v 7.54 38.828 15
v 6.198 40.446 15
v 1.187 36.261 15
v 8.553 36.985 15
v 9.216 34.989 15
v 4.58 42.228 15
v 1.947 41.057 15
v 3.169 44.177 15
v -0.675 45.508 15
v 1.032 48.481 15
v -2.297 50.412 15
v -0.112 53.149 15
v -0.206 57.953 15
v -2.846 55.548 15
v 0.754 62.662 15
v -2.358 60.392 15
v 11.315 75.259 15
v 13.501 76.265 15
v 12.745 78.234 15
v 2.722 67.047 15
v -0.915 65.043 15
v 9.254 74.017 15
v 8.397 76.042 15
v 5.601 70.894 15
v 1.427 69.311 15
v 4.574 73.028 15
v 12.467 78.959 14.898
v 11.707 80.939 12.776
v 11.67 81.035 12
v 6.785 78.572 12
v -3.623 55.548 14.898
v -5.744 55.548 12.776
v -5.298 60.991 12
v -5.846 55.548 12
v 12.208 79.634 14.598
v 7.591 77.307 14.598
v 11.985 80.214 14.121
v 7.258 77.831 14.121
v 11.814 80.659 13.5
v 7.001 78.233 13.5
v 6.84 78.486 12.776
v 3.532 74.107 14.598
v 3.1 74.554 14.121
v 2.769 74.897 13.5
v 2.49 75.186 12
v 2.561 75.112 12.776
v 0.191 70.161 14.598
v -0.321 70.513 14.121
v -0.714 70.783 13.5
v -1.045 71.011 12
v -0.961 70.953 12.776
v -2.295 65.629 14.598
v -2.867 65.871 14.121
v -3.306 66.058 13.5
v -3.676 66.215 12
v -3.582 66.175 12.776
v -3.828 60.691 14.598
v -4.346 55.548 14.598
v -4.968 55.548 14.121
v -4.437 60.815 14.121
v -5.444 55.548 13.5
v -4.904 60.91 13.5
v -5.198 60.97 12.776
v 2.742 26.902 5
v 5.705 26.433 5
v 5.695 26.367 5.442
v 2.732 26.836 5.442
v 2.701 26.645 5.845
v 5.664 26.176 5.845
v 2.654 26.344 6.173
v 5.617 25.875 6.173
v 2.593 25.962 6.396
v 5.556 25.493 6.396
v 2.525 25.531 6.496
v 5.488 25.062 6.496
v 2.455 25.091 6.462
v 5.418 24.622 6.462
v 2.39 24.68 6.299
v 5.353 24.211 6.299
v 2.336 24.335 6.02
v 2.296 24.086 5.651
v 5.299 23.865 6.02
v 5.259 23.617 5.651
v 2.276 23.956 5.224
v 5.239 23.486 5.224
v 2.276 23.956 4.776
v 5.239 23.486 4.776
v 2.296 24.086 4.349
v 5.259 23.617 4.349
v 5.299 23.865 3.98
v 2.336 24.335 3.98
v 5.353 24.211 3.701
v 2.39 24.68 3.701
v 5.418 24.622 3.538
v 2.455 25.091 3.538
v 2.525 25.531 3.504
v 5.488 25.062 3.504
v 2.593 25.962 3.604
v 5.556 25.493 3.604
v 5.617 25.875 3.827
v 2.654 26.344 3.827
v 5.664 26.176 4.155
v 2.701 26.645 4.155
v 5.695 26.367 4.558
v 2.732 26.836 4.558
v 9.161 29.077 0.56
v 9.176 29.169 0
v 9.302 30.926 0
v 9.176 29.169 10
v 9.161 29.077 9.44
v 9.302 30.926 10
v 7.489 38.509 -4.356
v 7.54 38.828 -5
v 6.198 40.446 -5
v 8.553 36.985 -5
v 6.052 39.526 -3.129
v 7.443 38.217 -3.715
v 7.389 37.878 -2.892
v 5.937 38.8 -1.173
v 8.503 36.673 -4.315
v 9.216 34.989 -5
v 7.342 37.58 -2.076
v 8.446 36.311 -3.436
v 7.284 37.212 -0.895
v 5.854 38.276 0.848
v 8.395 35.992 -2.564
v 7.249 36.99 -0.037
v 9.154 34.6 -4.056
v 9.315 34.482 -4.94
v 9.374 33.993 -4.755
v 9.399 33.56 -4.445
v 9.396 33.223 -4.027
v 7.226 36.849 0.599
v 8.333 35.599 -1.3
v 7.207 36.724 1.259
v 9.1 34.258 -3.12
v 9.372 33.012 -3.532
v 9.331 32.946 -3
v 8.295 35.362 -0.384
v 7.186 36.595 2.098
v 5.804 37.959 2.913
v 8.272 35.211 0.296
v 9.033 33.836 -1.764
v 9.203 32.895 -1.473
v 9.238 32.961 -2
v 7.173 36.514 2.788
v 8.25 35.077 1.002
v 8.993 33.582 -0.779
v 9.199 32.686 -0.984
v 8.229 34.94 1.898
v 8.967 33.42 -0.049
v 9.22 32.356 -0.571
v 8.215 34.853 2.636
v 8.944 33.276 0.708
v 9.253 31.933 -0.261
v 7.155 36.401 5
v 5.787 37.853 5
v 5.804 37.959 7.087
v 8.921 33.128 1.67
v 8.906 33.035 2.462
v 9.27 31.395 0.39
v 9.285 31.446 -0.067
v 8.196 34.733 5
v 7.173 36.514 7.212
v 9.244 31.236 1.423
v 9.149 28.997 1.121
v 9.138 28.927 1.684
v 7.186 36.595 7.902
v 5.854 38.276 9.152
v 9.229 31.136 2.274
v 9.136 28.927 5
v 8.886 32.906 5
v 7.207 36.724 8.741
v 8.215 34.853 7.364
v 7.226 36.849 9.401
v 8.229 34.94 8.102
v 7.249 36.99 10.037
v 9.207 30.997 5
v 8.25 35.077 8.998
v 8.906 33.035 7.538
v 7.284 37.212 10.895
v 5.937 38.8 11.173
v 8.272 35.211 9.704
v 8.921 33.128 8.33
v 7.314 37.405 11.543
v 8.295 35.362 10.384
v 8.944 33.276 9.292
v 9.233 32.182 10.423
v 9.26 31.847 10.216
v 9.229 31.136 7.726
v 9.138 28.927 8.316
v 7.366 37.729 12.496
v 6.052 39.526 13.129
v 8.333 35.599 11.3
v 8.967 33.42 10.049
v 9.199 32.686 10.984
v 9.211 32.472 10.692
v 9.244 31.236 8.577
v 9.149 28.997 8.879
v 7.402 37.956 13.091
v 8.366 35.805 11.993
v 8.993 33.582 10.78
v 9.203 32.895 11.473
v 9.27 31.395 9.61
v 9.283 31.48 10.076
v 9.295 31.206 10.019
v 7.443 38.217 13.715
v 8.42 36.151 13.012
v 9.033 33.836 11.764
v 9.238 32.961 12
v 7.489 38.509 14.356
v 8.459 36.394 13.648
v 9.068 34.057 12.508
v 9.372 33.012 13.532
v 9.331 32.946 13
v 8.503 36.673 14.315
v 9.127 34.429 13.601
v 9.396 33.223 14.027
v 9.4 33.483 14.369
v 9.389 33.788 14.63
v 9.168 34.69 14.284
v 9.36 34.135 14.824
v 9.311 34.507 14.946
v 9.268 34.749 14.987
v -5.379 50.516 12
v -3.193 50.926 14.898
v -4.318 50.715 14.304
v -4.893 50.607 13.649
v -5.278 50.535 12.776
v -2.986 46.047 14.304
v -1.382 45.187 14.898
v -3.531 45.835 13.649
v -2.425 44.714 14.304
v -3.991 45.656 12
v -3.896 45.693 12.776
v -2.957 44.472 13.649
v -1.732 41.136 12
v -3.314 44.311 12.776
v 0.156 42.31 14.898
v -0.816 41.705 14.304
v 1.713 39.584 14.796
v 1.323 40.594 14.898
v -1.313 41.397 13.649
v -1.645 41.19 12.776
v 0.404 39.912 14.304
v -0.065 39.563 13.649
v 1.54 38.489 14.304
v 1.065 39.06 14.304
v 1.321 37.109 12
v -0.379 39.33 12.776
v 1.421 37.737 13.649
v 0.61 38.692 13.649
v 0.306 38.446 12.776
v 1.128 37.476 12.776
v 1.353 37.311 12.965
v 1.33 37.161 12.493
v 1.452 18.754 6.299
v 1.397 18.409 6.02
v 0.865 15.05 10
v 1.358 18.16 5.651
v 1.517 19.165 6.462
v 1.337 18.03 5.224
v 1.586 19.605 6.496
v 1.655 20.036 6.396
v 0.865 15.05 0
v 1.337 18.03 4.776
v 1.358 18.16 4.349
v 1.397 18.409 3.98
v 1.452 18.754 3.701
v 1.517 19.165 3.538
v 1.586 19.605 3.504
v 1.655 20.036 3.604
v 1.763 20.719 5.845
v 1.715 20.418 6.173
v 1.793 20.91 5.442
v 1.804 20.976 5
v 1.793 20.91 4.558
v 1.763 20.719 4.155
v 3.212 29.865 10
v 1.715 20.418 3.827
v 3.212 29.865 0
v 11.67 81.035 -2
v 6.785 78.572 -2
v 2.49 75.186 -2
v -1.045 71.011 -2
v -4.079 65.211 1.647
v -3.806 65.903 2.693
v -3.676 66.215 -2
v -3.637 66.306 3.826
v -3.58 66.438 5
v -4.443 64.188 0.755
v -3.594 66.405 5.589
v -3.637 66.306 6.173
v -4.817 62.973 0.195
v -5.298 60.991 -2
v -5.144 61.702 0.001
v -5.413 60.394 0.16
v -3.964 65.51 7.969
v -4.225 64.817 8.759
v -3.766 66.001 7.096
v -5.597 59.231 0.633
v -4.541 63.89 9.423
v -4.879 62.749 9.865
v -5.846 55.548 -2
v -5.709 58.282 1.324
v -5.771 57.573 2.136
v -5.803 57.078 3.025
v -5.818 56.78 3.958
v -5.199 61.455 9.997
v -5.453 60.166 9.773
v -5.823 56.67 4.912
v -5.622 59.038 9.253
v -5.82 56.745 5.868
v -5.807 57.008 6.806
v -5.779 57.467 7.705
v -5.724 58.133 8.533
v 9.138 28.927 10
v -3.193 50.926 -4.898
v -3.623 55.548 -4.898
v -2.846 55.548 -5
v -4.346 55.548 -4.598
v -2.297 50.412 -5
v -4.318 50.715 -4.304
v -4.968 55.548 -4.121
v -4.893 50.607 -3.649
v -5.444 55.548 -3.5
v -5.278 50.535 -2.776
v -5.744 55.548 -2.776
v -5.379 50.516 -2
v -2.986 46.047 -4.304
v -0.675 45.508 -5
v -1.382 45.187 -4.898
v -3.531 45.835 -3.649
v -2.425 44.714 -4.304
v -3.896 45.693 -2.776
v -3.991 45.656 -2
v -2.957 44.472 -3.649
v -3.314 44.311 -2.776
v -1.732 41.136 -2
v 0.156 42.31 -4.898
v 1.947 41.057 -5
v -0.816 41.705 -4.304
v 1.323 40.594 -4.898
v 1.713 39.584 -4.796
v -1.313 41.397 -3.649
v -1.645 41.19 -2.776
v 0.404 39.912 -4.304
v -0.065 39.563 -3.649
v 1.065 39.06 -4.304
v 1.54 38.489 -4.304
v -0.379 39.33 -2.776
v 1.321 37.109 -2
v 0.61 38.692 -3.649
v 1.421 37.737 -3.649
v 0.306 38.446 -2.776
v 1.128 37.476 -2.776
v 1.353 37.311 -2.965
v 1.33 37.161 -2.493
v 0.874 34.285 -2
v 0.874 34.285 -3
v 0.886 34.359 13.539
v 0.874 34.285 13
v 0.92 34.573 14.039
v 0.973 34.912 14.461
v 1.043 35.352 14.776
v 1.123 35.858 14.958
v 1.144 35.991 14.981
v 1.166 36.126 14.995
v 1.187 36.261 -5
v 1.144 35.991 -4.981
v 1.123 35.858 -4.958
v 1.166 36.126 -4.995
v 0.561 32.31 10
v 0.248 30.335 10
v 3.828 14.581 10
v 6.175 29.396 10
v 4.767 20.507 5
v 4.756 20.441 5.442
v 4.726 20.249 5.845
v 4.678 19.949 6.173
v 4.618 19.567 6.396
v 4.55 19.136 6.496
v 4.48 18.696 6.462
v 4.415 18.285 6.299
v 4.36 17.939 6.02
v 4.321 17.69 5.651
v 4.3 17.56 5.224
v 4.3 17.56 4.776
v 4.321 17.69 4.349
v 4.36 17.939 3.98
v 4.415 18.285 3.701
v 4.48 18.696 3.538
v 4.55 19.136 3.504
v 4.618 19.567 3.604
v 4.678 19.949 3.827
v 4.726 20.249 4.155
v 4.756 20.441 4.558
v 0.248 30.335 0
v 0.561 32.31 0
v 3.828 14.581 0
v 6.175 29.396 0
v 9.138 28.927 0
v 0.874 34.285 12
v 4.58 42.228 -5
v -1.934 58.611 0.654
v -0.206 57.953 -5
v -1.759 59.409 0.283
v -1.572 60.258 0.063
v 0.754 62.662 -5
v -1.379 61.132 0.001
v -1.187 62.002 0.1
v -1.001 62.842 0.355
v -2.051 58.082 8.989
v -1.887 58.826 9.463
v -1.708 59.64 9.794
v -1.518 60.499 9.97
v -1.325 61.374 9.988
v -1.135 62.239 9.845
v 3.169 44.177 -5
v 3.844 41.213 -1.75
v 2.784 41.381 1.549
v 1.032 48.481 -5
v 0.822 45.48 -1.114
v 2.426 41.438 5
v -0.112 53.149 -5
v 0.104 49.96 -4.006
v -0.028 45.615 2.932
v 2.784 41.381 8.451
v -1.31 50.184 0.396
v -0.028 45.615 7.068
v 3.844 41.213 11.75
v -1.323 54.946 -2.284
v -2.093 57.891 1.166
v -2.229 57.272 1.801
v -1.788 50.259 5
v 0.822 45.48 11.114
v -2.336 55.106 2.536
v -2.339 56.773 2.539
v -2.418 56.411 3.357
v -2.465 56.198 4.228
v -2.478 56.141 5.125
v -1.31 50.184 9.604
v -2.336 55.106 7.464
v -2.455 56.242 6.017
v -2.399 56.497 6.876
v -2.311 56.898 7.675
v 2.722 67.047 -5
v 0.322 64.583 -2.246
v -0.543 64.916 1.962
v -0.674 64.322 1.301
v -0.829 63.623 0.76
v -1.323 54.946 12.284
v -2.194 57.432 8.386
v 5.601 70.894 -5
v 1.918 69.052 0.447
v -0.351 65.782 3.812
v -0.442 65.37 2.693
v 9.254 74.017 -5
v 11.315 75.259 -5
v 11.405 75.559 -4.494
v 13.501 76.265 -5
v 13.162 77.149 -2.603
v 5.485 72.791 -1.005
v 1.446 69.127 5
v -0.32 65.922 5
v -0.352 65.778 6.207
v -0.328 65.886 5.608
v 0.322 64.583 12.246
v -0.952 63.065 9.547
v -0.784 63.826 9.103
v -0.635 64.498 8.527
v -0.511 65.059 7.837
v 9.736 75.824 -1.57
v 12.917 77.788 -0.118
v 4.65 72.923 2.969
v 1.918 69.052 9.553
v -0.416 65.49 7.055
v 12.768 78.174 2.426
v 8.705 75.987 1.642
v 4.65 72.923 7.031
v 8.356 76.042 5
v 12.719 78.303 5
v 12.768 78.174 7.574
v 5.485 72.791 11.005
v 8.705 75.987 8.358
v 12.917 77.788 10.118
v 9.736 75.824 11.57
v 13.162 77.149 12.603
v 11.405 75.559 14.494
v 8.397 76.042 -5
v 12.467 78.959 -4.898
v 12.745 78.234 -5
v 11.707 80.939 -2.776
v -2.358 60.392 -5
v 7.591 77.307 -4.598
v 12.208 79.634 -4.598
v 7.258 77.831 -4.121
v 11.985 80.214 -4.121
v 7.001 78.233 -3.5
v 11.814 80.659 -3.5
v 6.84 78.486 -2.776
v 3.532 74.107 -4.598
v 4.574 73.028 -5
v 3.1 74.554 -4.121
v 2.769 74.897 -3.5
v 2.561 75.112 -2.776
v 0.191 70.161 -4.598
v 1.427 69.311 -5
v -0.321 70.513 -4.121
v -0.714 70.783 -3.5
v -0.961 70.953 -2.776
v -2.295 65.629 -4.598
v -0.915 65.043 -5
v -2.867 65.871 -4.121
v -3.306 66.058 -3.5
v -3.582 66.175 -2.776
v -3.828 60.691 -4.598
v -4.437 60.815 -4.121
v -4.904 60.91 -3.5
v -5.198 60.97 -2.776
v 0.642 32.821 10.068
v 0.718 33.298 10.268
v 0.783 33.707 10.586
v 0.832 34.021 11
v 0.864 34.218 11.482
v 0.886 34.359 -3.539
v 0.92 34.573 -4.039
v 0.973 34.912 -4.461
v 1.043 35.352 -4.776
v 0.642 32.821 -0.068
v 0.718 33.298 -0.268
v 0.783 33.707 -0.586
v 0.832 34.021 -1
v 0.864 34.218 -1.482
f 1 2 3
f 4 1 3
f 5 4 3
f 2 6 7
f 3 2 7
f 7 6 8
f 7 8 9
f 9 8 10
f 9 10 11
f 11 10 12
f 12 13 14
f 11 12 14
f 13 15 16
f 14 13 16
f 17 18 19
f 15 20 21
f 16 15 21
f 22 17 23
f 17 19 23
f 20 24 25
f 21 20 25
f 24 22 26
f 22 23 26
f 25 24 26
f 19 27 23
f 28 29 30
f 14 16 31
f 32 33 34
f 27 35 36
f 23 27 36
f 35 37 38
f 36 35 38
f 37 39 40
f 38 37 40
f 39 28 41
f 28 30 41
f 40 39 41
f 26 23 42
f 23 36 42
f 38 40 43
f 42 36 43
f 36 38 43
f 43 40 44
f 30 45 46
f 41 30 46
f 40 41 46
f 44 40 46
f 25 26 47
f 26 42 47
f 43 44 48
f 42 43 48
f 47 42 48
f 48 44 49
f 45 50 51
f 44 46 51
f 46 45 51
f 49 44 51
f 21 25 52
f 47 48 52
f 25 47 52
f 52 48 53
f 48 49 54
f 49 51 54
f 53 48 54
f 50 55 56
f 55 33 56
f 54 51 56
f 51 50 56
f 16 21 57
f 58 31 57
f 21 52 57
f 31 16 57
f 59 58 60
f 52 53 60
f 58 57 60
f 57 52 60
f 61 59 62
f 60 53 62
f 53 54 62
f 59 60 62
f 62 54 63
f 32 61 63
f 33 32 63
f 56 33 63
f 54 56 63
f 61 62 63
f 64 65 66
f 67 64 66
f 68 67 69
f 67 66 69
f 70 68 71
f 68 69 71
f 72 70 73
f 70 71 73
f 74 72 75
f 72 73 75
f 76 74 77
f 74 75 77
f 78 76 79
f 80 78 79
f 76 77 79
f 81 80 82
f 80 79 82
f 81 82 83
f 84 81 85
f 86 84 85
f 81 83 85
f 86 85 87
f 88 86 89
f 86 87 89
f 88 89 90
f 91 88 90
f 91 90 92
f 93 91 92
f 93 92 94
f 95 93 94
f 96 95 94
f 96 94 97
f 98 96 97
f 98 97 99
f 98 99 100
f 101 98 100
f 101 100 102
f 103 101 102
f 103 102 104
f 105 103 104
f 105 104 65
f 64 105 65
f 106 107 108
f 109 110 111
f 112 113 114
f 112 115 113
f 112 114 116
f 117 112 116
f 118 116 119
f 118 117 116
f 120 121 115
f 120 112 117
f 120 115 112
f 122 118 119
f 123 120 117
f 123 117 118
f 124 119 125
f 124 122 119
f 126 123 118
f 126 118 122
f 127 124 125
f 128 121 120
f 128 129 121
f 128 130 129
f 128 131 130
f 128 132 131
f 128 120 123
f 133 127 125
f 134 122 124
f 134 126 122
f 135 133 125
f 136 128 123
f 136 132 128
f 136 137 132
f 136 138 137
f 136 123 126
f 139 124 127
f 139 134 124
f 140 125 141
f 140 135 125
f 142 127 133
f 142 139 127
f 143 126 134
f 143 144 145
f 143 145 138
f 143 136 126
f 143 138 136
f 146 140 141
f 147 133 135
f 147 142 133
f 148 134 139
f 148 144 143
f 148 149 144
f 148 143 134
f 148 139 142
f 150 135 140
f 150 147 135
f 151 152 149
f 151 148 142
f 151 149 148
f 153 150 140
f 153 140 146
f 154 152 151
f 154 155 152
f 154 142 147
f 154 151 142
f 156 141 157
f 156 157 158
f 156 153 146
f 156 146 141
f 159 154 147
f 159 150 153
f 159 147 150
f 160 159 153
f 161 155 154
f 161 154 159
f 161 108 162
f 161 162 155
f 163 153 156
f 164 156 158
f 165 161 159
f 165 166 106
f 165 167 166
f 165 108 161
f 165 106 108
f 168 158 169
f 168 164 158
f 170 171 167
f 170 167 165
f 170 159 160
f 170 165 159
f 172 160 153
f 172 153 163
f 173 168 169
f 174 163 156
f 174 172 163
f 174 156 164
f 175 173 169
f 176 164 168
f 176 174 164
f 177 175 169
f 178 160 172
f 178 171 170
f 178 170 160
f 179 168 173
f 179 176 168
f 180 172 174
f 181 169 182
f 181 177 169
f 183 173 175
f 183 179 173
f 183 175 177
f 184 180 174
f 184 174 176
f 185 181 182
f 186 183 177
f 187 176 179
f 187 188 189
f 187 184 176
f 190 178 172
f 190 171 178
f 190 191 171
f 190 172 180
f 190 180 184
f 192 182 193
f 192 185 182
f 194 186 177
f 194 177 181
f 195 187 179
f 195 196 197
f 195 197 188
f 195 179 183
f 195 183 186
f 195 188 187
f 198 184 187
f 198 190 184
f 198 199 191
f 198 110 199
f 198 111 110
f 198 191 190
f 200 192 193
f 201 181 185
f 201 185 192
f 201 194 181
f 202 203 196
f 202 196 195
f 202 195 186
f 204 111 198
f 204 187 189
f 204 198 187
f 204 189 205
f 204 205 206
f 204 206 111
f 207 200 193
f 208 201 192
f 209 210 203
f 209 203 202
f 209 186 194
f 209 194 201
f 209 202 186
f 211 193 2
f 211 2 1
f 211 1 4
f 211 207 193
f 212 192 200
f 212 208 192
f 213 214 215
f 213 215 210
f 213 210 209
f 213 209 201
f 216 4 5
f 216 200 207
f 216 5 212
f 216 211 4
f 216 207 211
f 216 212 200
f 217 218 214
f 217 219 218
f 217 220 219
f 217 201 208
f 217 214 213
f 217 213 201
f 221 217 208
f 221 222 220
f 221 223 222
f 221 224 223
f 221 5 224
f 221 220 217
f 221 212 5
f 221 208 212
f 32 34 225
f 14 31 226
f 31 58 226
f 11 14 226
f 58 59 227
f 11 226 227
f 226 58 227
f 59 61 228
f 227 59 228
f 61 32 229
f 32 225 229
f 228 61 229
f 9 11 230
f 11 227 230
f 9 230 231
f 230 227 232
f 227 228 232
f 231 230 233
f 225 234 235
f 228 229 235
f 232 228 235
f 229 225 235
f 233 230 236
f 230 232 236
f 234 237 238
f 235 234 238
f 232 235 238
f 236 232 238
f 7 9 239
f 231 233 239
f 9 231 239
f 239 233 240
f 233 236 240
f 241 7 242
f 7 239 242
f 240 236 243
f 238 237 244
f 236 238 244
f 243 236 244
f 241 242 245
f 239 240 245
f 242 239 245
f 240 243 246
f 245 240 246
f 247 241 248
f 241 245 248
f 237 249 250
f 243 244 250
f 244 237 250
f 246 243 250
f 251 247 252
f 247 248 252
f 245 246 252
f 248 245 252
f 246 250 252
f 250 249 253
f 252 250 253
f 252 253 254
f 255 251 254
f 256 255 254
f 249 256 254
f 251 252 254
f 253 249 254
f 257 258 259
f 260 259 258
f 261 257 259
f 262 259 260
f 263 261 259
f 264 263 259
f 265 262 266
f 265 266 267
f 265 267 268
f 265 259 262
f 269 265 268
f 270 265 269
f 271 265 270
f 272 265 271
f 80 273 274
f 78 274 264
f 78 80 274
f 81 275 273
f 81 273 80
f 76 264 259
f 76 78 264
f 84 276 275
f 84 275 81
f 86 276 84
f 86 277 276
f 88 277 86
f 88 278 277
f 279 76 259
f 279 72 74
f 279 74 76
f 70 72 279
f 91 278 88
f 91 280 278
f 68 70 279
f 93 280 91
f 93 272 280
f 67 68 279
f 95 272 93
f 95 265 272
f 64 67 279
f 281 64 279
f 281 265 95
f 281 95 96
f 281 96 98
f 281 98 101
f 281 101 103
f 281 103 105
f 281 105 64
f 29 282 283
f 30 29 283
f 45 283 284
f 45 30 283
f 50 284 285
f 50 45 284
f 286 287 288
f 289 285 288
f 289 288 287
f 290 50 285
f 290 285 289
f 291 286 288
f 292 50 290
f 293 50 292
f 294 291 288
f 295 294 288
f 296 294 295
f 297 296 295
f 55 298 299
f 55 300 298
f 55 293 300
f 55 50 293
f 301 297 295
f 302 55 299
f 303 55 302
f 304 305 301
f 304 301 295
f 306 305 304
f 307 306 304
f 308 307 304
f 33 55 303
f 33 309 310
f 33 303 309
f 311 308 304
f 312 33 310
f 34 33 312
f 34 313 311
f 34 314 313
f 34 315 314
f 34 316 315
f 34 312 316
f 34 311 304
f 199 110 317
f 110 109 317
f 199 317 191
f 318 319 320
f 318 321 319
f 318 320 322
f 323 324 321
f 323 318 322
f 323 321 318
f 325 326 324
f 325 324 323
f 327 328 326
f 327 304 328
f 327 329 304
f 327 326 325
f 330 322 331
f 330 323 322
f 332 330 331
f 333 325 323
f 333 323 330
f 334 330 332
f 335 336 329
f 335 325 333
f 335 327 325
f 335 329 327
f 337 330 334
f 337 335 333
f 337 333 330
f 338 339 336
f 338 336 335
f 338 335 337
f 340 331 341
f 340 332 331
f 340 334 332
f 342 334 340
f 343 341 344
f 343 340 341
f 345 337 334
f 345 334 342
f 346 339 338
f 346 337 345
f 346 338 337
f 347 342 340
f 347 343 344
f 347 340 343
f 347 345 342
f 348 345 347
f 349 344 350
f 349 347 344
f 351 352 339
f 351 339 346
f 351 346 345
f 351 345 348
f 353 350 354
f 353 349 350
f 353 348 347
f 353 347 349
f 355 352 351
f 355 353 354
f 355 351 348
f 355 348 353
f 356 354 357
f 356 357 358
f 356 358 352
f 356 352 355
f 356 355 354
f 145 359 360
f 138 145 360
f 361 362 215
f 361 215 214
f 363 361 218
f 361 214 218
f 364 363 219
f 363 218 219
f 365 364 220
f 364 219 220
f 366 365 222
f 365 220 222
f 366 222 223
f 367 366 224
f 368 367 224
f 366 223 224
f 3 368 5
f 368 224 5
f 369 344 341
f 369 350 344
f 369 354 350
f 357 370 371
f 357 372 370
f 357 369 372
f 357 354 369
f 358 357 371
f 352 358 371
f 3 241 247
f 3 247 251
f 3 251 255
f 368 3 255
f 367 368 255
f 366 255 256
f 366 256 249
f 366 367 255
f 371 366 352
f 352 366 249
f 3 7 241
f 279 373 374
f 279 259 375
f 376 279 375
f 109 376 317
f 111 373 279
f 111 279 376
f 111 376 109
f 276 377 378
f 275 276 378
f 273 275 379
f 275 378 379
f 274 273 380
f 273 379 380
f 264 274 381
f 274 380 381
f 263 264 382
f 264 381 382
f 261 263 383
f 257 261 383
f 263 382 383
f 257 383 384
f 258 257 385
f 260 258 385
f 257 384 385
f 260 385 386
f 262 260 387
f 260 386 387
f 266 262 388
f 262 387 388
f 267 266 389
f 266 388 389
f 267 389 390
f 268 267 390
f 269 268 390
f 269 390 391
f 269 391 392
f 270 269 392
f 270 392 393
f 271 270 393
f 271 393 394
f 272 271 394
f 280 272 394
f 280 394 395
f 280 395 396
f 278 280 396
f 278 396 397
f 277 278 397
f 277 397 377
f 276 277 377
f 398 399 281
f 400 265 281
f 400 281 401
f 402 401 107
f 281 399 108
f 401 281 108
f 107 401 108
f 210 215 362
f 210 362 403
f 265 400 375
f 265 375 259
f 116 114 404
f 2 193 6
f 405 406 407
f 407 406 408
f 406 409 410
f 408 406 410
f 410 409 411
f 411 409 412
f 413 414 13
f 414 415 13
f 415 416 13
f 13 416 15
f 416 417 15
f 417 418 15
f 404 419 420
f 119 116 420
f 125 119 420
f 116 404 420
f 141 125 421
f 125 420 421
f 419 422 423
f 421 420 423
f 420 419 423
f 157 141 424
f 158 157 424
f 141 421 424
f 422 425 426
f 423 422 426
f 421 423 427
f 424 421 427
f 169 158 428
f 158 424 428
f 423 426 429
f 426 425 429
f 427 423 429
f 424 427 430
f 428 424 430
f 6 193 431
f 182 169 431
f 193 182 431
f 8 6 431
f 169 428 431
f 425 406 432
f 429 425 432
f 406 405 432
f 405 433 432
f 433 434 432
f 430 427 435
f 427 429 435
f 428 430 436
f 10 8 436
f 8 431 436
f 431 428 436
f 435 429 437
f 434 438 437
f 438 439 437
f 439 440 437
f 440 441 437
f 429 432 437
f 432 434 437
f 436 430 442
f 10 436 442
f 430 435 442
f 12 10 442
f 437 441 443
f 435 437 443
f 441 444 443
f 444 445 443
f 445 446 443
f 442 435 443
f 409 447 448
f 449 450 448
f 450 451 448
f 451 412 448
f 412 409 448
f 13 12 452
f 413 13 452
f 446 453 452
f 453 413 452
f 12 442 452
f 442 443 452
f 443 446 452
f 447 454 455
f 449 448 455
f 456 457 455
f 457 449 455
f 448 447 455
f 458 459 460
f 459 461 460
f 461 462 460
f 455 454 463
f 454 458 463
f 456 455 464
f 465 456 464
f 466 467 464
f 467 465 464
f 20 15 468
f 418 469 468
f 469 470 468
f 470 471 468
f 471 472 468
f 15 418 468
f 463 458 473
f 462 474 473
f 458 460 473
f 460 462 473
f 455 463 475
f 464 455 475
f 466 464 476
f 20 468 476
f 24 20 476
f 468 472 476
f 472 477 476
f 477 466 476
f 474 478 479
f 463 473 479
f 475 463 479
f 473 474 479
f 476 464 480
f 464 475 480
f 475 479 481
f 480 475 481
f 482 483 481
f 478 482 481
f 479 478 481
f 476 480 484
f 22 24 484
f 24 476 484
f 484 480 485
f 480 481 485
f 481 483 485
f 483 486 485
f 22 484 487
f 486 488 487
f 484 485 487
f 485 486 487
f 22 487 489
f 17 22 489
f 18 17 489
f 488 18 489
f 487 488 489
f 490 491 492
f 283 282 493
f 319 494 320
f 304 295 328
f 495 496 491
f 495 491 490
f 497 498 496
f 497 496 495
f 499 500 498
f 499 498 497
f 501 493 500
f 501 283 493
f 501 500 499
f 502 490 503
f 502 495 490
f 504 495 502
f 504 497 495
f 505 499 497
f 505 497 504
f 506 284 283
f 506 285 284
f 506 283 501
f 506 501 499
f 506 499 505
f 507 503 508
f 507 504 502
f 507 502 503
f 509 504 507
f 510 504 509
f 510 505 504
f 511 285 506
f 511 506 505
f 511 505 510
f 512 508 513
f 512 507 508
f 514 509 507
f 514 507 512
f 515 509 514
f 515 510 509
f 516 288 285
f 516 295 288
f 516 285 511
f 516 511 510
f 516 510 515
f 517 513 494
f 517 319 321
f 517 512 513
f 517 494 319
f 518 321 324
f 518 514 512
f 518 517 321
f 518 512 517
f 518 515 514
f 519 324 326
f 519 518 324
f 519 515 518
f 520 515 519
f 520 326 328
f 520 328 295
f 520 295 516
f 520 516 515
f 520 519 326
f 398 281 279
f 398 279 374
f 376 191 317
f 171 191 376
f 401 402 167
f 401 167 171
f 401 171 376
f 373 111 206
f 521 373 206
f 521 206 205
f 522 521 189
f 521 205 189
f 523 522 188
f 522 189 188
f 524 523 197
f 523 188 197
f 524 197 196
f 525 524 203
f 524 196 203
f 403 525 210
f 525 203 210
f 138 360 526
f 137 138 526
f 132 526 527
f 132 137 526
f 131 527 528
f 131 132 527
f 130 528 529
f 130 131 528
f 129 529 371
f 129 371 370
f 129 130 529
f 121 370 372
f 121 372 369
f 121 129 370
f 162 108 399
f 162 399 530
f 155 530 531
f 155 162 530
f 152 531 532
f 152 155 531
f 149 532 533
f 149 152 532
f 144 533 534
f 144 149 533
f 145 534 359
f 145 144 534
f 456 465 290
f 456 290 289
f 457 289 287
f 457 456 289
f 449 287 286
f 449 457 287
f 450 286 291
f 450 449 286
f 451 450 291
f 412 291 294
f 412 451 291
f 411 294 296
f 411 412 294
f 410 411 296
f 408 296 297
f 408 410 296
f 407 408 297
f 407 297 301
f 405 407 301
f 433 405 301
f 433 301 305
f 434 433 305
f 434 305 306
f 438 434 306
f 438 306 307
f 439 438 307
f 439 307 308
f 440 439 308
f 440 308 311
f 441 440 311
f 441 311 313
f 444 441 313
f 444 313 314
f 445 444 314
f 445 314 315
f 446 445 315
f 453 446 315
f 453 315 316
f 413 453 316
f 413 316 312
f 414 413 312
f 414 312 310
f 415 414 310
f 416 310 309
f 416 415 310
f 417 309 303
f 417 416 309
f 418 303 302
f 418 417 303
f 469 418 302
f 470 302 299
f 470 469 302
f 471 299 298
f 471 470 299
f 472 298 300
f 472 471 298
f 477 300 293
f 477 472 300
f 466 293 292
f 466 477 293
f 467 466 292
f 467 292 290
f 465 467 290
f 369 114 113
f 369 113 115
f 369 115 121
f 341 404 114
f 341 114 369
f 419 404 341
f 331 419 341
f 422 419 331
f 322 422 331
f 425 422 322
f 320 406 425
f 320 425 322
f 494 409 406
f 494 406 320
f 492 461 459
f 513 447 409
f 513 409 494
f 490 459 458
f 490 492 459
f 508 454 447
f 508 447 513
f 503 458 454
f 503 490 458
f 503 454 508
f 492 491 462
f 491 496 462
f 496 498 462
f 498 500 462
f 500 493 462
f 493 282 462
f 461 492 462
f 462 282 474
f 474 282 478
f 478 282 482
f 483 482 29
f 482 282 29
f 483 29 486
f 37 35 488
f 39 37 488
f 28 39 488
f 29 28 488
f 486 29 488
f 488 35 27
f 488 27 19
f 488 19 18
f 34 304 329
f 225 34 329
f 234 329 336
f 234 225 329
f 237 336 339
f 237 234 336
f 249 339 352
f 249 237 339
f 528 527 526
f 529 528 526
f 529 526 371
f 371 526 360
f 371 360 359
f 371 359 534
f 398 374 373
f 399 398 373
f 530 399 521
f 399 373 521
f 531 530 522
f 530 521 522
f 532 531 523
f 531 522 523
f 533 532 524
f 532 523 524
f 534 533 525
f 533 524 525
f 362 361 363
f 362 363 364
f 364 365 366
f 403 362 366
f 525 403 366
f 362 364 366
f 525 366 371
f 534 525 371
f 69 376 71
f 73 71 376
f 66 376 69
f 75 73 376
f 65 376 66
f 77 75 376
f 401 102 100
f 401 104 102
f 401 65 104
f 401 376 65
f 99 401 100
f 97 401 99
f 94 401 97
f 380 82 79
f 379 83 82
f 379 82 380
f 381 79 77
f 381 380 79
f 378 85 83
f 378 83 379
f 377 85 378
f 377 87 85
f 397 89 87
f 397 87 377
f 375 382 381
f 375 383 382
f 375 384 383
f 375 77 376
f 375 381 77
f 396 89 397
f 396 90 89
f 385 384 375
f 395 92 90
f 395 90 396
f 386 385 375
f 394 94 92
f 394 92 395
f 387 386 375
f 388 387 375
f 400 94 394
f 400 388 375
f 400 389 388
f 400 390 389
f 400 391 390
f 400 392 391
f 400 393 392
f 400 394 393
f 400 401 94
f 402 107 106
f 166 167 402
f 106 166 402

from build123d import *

# Parameters (mm, degrees)
SKETCH_1_R               = 13.75
EXTRUDE_1_DEPTH          = 10
CUT_EXTRUDE_1_DEPTH      = 22.866069606
PATTERN_CIRCULAR_1_COUNT = 20
EXTRUDE_2_DEPTH          = 5
EXTRUDE_2_DEPTH_BACK     = 15
CUT_EXTRUDE_3_DEPTH      = 10
CUT_EXTRUDE_3_DEPTH_BACK = 32
SKETCH_7_W               = 5
SKETCH_7_H               = 34
CUT_EXTRUDE_START        = -22
CUT_EXTRUDE_4_DEPTH      = 22
FILLET_2_R               = 2
FILLET_3_R               = 3
SKETCH_16_R              = 2
CUT_EXTRUDE_5_DEPTH      = 16.5
EXTRUDE_START            = 3.5
SKETCH_18_R              = 5
SKETCH_18_R_2            = 2
EXTRUDE_4_DEPTH          = 3.5
SKETCH_19_R              = 8
CUT_EXTRUDE_7_DEPTH      = 3
FILLET_4_R               = 2
CUT_EXTRUDE_8_DEPTH      = 10
CUT_EXTRUDE_9_DEPTH      = 22
SKETCH_22_R              = 1.5
CUT_EXTRUDE_10_DEPTH     = 22
SKETCH_24_R              = 5
CUT_EXTRUDE_11_DEPTH     = 26
FILLET_5_R               = 10


with BuildPart() as part:
    # 草图1 → 凸台-拉伸1 (new body)
    with BuildSketch(Plane.XY):
        Circle(SKETCH_1_R)
    extrude(amount=EXTRUDE_1_DEPTH)

    # 草图2 → 切除-拉伸1 (cut, through all)
    with BuildSketch(Plane.XY):
        with BuildLine():
            ThreePointArc((0.241645751, 10.934830295), (0, 10.9375), (-0.241645751, 10.934830295))
            add(Edge.make_bspline(
                [(-0.241645751, 10.934830295), (-0.763986756, 11.11684439), (-0.696355124, 11.483892124), (-0.766121321, 11.837511753), (-0.773615233, 11.871945767), (-0.782888612, 11.910793269), (-0.794115121, 11.953996045), (-0.807473925, 12.001489371), (-0.823140069, 12.053203535), (-0.841287339, 12.109063416), (-0.862087187, 12.168988684), (-0.885708875, 12.232893806), (-0.912319248, 12.300688126), (-0.942082628, 12.372275913), (-0.975160664, 12.447556439), (-1.011712206, 12.526424039), (-1.051893167, 12.608768189), (-1.095856396, 12.694473577), (-1.143751548, 12.783420187), (-1.195724957, 12.87548338), (-1.251919512, 12.970533976), (-1.312474533, 13.068438347), (-1.377525652, 13.169058507), (-1.447204695, 13.272252205), (-1.521639564, 13.377873025), (-1.600954126, 13.485770488), (-1.685268101, 13.595790151), (-1.774696952, 13.707773716), (-1.869351783, 13.821559139), (-1.969339231, 13.936980743), (-2.074761371, 14.053869328), (-2.185715611, 14.172052294), (-2.302294605, 14.291353753), (-2.424586158, 14.411594659), (-2.552673133, 14.532592924), (-2.686633373, 14.654163553), (-2.826539612, 14.776118764), (-2.972459398, 14.898268124), (-3.124455015, 15.020418683), (-3.282583418, 15.142375102), (-3.446896124, 15.2639398), (-3.676841988, 15.427049835), (-3.854915516, 15.545415751), (-3.976447477, 15.622814825)],
                knots=[0, 0, 0, 0, 0.165916003, 0.170905922, 0.176663519, 0.183188797, 0.190481754, 0.198542391, 0.207370708, 0.216966704, 0.22733038, 0.238461736, 0.250360771, 0.263027487, 0.276461881, 0.290663956, 0.30563371, 0.321371144, 0.337876258, 0.355149051, 0.373189524, 0.391997677, 0.411573509, 0.431917021, 0.453028213, 0.474907084, 0.497553636, 0.520967867, 0.545149777, 0.570099367, 0.595816637, 0.622301587, 0.649554216, 0.677574526, 0.706362514, 0.735918183, 0.766241531, 0.797332559, 0.829191267, 0.861817654, 0.895211721, 0.929373468, 1, 1, 1, 1], degree=3))
            ThreePointArc((-3.976447477, 15.622814825), (0, 16.120932901), (3.976447477, 15.622814825))
            add(Edge.make_bspline(
                [(0.241645751, 10.934830295), (0.763986756, 11.11684439), (0.696355124, 11.483892124), (0.766121321, 11.837511753), (0.773615233, 11.871945767), (0.782888612, 11.910793269), (0.794115121, 11.953996045), (0.807473925, 12.001489371), (0.823140069, 12.053203535), (0.841287339, 12.109063416), (0.862087187, 12.168988684), (0.885708875, 12.232893806), (0.912319248, 12.300688126), (0.942082628, 12.372275913), (0.975160664, 12.447556439), (1.011712206, 12.526424039), (1.051893167, 12.608768189), (1.095856396, 12.694473577), (1.143751548, 12.783420187), (1.195724957, 12.87548338), (1.251919512, 12.970533976), (1.312474533, 13.068438347), (1.377525652, 13.169058507), (1.447204695, 13.272252205), (1.521639564, 13.377873025), (1.600954126, 13.485770488), (1.685268101, 13.595790151), (1.774696952, 13.707773716), (1.869351783, 13.821559139), (1.969339231, 13.936980743), (2.074761371, 14.053869328), (2.185715611, 14.172052294), (2.302294605, 14.291353753), (2.424586158, 14.411594659), (2.552673133, 14.532592924), (2.686633373, 14.654163553), (2.826539612, 14.776118764), (2.972459398, 14.898268124), (3.124455015, 15.020418683), (3.282583418, 15.142375102), (3.446896124, 15.2639398), (3.676841988, 15.427049835), (3.854915516, 15.545415751), (3.976447477, 15.622814825)],
                knots=[0, 0, 0, 0, 0.165916003, 0.170905922, 0.176663519, 0.183188797, 0.190481754, 0.198542391, 0.207370708, 0.216966704, 0.22733038, 0.238461736, 0.250360771, 0.263027487, 0.276461881, 0.290663956, 0.30563371, 0.321371144, 0.337876258, 0.355149051, 0.373189524, 0.391997677, 0.411573509, 0.431917021, 0.453028213, 0.474907084, 0.497553636, 0.520967867, 0.545149777, 0.570099367, 0.595816637, 0.622301587, 0.649554216, 0.677574526, 0.706362514, 0.735918183, 0.766241531, 0.797332559, 0.829191267, 0.861817654, 0.895211721, 0.929373468, 1, 1, 1, 1], degree=3))
        make_face()
    cut_extrude_1 = extrude(amount=CUT_EXTRUDE_1_DEPTH, mode=Mode.SUBTRACT)

    # 阵列(圆周)1: 切除-拉伸1 ×20 about axis
    pattern_circular_1_axis = Axis((0, 0, -1.5), (0, 0, 1))
    for i in range(1, PATTERN_CIRCULAR_1_COUNT):
        add(cut_extrude_1.rotate(pattern_circular_1_axis, i * 360 / PATTERN_CIRCULAR_1_COUNT), mode=Mode.SUBTRACT)

    # 草图6 → 凸台-拉伸2 (add, two sides: drawn at the far end of the back side and taken through both)
    with BuildSketch(Plane(origin=(0, 0, 0), x_dir=(-1, 0, 0), z_dir=(0, 0, -1)).offset(-EXTRUDE_2_DEPTH_BACK)):
        with BuildLine():
            Line((-4.444597533, -0.703955093), (4.444597533, 0.703955093))
            Line((4.444597533, 0.703955093), (-1.123309149, 35.858334335))
            ThreePointArc((-1.123309149, 35.858334335), (6.18175463, 61.653569146), (-11.311209389, 81.969924763))
            Line((-11.311209389, 81.969924763), (-15.719831619, 70.4850712))
            Line((-15.719831619, 70.4850712), (-10.012504214, 34.45042415))
            Line((-10.012504214, 34.45042415), (-4.444597533, -0.703955093))
        make_face()
    extrude(amount=EXTRUDE_2_DEPTH + EXTRUDE_2_DEPTH_BACK)

    # 草图7 → 切除-拉伸3 (cut, two sides: drawn at the far end of the back side and taken through both)
    with BuildSketch(Plane(origin=(4.444597533, -0.703955093, 0), x_dir=(0, 0, -1), z_dir=(0.9876883405951378, -0.15643446504023126, 0)).offset(-CUT_EXTRUDE_3_DEPTH_BACK)):
        with Locations((2.5, 17)):
            Rectangle(SKETCH_7_W, SKETCH_7_H)
        with Locations((-12.5, 17)):
            Rectangle(SKETCH_7_W, SKETCH_7_H)
    extrude(amount=CUT_EXTRUDE_3_DEPTH + CUT_EXTRUDE_3_DEPTH_BACK, mode=Mode.SUBTRACT)

    # 草图13 → 切除-旋转2 (revolve, cut)
    with BuildSketch(Plane(origin=(12.346104257, -1.955430813, 0), x_dir=(0, 0, 1), z_dir=(-0.9876883405951388, 0.1564344650402244, 0))):
        with BuildLine():
            Line((5, 82.653118449), (5, 34.653118449))
            ThreePointArc((5, 34.653118449), (29, 58.653118449), (5, 82.653118449))
        make_face()
    revolve(axis=Axis((12.41385891, -1.527644771, 5), (0.1564344650402244, 0.9876883405951388, 0)), mode=Mode.SUBTRACT)

    # 草图12 → 切除-拉伸4 (cut)
    with BuildSketch(Plane(origin=(0, 0, -5), x_dir=(-1, 0, 0), z_dir=(0, 0, -1)).offset(CUT_EXTRUDE_START)):
        with BuildLine():
            Line((-11.311209389, 81.969924763), (-11.670273789, 81.03453002))
            ThreePointArc((-11.670273789, 81.03453002), (1.044926137, 71.010674644), (5.846281188, 55.547784376))
            ThreePointArc((5.846281188, 55.547784376), (3.991334875, 45.656412233), (-1.321428913, 37.109213298))
            Line((-1.321428913, 37.109213298), (-1.123309149, 35.858334335))
            ThreePointArc((-1.123309149, 35.858334335), (4.779753161, 44.926816989), (6.848224584, 55.547784376))
            ThreePointArc((6.848224584, 55.547784376), (1.87065393, 71.578181633), (-11.311209389, 81.969924763))
        make_face()
    extrude(amount=CUT_EXTRUDE_4_DEPTH, mode=Mode.SUBTRACT)

    # 圆角2
    fillet_2_edges = [part.edges().sort_by_distance(p)[0] for p in [
        (5.318771811, 33.58140358, 15),
        (5.318771811, 33.58140358, -5),
        (5.318771811, 33.58140358, 0),
        (5.318771811, 33.58140358, 10),
    ]]
    fillet(fillet_2_edges, radius=FILLET_2_R)

    # 圆角3
    fillet_3_edges = [part.edges().sort_by_distance(p)[0] for p in [
        (-5.118751176, 61.808282659, -5),
        (-5.118751176, 61.808282659, 15),
    ]]
    fillet(fillet_3_edges, radius=FILLET_3_R)

    # 草图16 → 切除-拉伸5 (cut)
    with BuildSketch(Plane.XY.offset(10)):
        Circle(SKETCH_16_R)
    extrude(amount=-CUT_EXTRUDE_5_DEPTH, mode=Mode.SUBTRACT)

    # 草图18 → 凸台-拉伸4 (add)
    with BuildSketch(Plane.XY.offset(10).offset(EXTRUDE_START)):
        Circle(SKETCH_18_R)
        Circle(SKETCH_18_R_2, mode=Mode.SUBTRACT)
    extrude(amount=-EXTRUDE_4_DEPTH)

    # 草图19 → 切除-拉伸7 (cut)
    with BuildSketch(Plane(origin=(0, 0, 0), x_dir=(-1, 0, 0), z_dir=(0, 0, -1))):
        Circle(SKETCH_19_R)
    extrude(amount=-CUT_EXTRUDE_7_DEPTH, mode=Mode.SUBTRACT)

    # 圆角4
    fillet_4_edges = [part.edges().sort_by_distance(p)[0] for p in [
        (-5, 0, 10),
    ]]
    fillet(fillet_4_edges, radius=FILLET_4_R)

    # 草图20 → 切除-拉伸8 (cut)
    with BuildSketch(Plane(origin=(0, 0, 0), x_dir=(-1, 0, 0), z_dir=(0, 0, -1))):
        with BuildLine():
            Line((5.774187452, 16.519950341), (3.608867158, 10.324968963))
            ThreePointArc((3.608867158, 10.324968963), (8.919105639, 6.330755157), (10.9375, 0))
            ThreePointArc((10.9375, 0), (10.936832553, -0.120830249), (10.934830295, -0.241645751))
            Line((10.934830295, -0.241645751), (17.498331559, -0.241645751))
            ThreePointArc((17.498331559, -0.241645751), (17.499582885, -0.120825755), (17.5, 0))
            ThreePointArc((17.5, 0), (14.270569022, 10.129208251), (5.774187452, 16.519950341))
        make_face()
    extrude(amount=-CUT_EXTRUDE_8_DEPTH, mode=Mode.SUBTRACT)

    # 草图21 → 切除-拉伸9 (cut)
    with BuildSketch(Plane(origin=(0, 0, 0), x_dir=(-1, 0, 0), z_dir=(0, 0, -1))):
        Polygon((-3.828049486, 14.580673411), (-0.864984465, 15.049976806), (-3.21150144, 29.865301915), (16.542265372, 32.993991216), (24.363988624, -16.390425814), (3.089937746, -19.759904455), (-18.106610022, -23.11710781), (-25.928333274, 26.267309219), (-6.174566462, 29.39599852), align=None)
    extrude(amount=-CUT_EXTRUDE_9_DEPTH, mode=Mode.SUBTRACT)

    # 草图22 → 切除-拉伸10 (cut)
    with BuildSketch(Plane(origin=(1.481532511, -0.234651698, 0), x_dir=(0, 0, -1), z_dir=(0.9876883405951379, -0.15643446504023095, 0))):
        with Locations(Location((-5, 25.5, 0), (0, 0, 90))):
            Circle(SKETCH_22_R)
        with Locations(Location((-5, 19.5, 0), (0, 0, 90))):
            Circle(SKETCH_22_R)
    extrude(amount=-CUT_EXTRUDE_10_DEPTH, mode=Mode.SUBTRACT)

    # 草图24 → 切除-拉伸11 (cut)
    with BuildSketch(Plane(origin=(0, 0, 0), x_dir=(0, 0, 1), z_dir=(-0.9876883405951388, 0.1564344650402244, 0))):
        with Locations(Location((5, 60.060474958, 0), (0, 0, 90))):
            Circle(SKETCH_24_R)
    extrude(amount=CUT_EXTRUDE_11_DEPTH, mode=Mode.SUBTRACT)

    # 圆角5
    # the kernel refuses this fillet: 10 mm, written as the material it takes off along each edge
    with BuildSketch(Plane(origin=(13.61996674, 57.227046138, 5), x_dir=(-0.06465125849803334, -0.4081919812676051, -0.910603932126063), z_dir=(0.1424498389856716, 0.8993928866609987, -0.41328014565975996))) as fillet_5_piece_1:
        with BuildLine():
            CenterArc((28.844410204, 10), FILLET_5_R, 211.965718751, 58.034281249)
            ThreePointArc((20.360760144, 4.705882353), (21.622492356, 2.414788732), (22.627416998, 0))
            Line((22.627416998, 0), (28.844410204, 0))
        make_face()
    revolve(axis=Axis((13.61996674, 57.227046138, 5), (-0.9876883405951378, 0.15643446504023112, 0)), revolution_arc=131.177888663, mode=Mode.SUBTRACT)


solid = part.part
